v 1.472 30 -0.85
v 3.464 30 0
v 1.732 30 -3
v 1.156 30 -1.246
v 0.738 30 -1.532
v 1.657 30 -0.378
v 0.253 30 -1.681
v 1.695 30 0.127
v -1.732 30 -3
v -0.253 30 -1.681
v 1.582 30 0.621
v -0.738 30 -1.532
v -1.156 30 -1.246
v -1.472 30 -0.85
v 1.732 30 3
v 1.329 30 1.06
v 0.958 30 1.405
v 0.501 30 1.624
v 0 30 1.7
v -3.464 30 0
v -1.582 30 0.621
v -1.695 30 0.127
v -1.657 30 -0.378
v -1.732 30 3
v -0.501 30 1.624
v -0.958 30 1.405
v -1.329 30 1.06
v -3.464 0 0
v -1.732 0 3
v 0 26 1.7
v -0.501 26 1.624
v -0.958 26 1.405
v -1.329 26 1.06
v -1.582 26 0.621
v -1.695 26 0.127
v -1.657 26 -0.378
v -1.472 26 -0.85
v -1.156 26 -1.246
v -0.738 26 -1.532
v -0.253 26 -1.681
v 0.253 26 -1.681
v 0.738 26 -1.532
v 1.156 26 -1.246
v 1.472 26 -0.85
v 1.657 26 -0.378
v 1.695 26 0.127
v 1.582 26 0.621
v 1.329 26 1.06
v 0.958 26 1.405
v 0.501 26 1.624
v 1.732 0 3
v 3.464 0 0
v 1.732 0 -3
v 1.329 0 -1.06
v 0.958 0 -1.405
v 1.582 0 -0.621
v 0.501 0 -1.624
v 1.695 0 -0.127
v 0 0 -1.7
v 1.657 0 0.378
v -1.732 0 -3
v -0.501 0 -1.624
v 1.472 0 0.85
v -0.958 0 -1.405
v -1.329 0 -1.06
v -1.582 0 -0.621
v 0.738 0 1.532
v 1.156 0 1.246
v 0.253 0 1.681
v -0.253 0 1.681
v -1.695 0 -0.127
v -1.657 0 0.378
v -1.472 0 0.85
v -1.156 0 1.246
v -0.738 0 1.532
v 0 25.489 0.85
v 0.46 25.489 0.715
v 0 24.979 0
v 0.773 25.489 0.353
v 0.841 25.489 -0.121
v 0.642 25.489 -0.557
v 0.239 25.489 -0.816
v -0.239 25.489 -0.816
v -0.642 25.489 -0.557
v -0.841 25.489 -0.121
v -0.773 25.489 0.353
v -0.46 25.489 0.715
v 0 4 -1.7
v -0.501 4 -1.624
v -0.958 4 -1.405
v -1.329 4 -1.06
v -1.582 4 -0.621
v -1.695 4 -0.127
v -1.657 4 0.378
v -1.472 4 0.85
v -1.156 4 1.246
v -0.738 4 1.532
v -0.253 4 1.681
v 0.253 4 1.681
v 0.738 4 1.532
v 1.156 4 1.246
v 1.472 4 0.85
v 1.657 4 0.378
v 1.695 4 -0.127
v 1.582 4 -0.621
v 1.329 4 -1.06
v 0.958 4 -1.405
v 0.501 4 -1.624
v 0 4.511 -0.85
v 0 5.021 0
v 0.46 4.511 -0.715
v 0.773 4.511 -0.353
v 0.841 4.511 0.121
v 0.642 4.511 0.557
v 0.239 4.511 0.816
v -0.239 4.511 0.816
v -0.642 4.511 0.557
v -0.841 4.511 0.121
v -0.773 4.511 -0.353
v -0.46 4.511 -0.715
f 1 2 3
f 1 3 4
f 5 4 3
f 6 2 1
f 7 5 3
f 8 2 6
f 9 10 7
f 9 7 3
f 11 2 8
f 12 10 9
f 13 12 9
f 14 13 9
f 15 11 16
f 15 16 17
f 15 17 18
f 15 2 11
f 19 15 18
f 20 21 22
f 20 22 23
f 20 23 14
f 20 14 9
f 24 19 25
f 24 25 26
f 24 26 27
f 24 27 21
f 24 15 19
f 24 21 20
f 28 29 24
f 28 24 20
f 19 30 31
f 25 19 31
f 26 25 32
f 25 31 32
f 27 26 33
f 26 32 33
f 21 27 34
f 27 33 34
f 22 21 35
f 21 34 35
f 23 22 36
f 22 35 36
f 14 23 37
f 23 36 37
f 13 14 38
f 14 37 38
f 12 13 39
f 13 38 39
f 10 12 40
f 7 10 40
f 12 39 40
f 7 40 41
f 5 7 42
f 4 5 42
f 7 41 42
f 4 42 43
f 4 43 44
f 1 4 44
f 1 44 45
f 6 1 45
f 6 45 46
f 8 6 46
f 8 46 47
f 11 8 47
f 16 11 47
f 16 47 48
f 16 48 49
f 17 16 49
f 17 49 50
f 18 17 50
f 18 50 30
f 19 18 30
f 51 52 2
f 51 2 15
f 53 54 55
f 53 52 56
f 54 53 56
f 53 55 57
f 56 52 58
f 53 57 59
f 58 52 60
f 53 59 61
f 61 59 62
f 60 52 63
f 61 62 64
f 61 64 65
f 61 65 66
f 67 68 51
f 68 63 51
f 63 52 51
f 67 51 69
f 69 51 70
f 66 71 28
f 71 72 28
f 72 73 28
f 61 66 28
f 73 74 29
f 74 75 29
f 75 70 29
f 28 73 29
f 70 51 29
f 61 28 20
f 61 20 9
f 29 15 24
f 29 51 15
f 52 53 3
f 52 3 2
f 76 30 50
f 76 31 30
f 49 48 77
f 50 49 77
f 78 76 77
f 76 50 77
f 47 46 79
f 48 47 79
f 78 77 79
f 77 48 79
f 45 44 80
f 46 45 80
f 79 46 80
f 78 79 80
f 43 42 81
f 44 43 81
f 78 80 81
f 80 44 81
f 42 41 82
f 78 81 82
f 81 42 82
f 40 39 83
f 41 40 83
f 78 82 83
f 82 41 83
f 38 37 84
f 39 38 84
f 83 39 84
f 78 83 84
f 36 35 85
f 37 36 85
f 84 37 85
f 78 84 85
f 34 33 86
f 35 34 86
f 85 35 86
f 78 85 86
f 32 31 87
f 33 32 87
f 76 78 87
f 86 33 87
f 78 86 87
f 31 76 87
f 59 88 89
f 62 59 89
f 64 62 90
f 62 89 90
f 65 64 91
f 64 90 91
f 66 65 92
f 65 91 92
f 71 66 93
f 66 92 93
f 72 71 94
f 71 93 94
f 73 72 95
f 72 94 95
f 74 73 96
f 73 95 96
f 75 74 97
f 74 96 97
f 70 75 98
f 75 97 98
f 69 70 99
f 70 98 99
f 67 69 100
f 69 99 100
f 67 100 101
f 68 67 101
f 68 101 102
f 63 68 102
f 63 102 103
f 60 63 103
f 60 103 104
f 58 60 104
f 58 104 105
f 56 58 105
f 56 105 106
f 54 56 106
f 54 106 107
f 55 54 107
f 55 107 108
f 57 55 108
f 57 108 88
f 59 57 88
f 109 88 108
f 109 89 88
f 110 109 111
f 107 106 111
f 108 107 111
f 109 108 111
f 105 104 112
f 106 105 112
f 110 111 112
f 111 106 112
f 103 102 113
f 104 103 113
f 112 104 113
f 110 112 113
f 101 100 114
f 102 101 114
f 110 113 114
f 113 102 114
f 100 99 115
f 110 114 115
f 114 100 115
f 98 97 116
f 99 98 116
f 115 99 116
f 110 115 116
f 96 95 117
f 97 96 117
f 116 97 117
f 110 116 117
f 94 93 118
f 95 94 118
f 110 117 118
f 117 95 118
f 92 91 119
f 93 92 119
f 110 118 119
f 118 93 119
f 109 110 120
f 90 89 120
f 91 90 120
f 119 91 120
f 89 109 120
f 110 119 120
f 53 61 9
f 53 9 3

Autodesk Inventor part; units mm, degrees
ref_plane "YZ Plane" through (0, 0, 0) normal (1, 0, 0) x (0, 1, 0)
ref_plane "XZ Plane" through (0, 0, 0) normal (0, 1, 0) x (-1, 0, 0)
ref_plane "XY Plane" through (0, 0, 0) normal (0, 0, 1) x (1, 0, 0)
sketch "Sketch1" plane through (0, 0, 0) normal (0, 1, 0) x (-1, 0, 0)
  line L0 (-1.7321, 3) -> (1.7321, 3)
  line L1 (1.7321, 3) -> (3.4641, 0)
  line L2 (3.4641, 0) -> (1.7321, -3)
  line L3 (1.7321, -3) -> (-1.7321, -3)
  line L4 (-1.7321, -3) -> (-3.4641, 0)
  line L5 (-3.4641, 0) -> (-1.7321, 3)
  point P0 (0, 0)
  point P1 (0, 0)
  dimension "d0" = 6
extrude "Extrusion1" add sketch "Sketch1" along normal blind 30
sketch "Sketch2" plane through (0, 30, 0) normal (0, 1, 0) x (1, 0, 0)
  point P0 (0, 0)
hole "Hole1" at (0, 30, 0) direction (0, -1, 0) diameter 3.4 depth 4 tip angle 118 clearance for "Hex Head Cap Screw ISO 24017" size "M3" standard "ISO"
sketch "Sketch3" plane through (0, 0, 0) normal (0, -1, 0) x (1, 0, 0)
  point P0 (0, 0)
hole "Hole2" at (0, 0, 0) direction (0, 1, 0) diameter 3.4 depth 4 tip angle 118 clearance for "Hex Head Cap Screw ISO 24017" size "M3" standard "ISO"
properties part number "tavtarto_30mm"
